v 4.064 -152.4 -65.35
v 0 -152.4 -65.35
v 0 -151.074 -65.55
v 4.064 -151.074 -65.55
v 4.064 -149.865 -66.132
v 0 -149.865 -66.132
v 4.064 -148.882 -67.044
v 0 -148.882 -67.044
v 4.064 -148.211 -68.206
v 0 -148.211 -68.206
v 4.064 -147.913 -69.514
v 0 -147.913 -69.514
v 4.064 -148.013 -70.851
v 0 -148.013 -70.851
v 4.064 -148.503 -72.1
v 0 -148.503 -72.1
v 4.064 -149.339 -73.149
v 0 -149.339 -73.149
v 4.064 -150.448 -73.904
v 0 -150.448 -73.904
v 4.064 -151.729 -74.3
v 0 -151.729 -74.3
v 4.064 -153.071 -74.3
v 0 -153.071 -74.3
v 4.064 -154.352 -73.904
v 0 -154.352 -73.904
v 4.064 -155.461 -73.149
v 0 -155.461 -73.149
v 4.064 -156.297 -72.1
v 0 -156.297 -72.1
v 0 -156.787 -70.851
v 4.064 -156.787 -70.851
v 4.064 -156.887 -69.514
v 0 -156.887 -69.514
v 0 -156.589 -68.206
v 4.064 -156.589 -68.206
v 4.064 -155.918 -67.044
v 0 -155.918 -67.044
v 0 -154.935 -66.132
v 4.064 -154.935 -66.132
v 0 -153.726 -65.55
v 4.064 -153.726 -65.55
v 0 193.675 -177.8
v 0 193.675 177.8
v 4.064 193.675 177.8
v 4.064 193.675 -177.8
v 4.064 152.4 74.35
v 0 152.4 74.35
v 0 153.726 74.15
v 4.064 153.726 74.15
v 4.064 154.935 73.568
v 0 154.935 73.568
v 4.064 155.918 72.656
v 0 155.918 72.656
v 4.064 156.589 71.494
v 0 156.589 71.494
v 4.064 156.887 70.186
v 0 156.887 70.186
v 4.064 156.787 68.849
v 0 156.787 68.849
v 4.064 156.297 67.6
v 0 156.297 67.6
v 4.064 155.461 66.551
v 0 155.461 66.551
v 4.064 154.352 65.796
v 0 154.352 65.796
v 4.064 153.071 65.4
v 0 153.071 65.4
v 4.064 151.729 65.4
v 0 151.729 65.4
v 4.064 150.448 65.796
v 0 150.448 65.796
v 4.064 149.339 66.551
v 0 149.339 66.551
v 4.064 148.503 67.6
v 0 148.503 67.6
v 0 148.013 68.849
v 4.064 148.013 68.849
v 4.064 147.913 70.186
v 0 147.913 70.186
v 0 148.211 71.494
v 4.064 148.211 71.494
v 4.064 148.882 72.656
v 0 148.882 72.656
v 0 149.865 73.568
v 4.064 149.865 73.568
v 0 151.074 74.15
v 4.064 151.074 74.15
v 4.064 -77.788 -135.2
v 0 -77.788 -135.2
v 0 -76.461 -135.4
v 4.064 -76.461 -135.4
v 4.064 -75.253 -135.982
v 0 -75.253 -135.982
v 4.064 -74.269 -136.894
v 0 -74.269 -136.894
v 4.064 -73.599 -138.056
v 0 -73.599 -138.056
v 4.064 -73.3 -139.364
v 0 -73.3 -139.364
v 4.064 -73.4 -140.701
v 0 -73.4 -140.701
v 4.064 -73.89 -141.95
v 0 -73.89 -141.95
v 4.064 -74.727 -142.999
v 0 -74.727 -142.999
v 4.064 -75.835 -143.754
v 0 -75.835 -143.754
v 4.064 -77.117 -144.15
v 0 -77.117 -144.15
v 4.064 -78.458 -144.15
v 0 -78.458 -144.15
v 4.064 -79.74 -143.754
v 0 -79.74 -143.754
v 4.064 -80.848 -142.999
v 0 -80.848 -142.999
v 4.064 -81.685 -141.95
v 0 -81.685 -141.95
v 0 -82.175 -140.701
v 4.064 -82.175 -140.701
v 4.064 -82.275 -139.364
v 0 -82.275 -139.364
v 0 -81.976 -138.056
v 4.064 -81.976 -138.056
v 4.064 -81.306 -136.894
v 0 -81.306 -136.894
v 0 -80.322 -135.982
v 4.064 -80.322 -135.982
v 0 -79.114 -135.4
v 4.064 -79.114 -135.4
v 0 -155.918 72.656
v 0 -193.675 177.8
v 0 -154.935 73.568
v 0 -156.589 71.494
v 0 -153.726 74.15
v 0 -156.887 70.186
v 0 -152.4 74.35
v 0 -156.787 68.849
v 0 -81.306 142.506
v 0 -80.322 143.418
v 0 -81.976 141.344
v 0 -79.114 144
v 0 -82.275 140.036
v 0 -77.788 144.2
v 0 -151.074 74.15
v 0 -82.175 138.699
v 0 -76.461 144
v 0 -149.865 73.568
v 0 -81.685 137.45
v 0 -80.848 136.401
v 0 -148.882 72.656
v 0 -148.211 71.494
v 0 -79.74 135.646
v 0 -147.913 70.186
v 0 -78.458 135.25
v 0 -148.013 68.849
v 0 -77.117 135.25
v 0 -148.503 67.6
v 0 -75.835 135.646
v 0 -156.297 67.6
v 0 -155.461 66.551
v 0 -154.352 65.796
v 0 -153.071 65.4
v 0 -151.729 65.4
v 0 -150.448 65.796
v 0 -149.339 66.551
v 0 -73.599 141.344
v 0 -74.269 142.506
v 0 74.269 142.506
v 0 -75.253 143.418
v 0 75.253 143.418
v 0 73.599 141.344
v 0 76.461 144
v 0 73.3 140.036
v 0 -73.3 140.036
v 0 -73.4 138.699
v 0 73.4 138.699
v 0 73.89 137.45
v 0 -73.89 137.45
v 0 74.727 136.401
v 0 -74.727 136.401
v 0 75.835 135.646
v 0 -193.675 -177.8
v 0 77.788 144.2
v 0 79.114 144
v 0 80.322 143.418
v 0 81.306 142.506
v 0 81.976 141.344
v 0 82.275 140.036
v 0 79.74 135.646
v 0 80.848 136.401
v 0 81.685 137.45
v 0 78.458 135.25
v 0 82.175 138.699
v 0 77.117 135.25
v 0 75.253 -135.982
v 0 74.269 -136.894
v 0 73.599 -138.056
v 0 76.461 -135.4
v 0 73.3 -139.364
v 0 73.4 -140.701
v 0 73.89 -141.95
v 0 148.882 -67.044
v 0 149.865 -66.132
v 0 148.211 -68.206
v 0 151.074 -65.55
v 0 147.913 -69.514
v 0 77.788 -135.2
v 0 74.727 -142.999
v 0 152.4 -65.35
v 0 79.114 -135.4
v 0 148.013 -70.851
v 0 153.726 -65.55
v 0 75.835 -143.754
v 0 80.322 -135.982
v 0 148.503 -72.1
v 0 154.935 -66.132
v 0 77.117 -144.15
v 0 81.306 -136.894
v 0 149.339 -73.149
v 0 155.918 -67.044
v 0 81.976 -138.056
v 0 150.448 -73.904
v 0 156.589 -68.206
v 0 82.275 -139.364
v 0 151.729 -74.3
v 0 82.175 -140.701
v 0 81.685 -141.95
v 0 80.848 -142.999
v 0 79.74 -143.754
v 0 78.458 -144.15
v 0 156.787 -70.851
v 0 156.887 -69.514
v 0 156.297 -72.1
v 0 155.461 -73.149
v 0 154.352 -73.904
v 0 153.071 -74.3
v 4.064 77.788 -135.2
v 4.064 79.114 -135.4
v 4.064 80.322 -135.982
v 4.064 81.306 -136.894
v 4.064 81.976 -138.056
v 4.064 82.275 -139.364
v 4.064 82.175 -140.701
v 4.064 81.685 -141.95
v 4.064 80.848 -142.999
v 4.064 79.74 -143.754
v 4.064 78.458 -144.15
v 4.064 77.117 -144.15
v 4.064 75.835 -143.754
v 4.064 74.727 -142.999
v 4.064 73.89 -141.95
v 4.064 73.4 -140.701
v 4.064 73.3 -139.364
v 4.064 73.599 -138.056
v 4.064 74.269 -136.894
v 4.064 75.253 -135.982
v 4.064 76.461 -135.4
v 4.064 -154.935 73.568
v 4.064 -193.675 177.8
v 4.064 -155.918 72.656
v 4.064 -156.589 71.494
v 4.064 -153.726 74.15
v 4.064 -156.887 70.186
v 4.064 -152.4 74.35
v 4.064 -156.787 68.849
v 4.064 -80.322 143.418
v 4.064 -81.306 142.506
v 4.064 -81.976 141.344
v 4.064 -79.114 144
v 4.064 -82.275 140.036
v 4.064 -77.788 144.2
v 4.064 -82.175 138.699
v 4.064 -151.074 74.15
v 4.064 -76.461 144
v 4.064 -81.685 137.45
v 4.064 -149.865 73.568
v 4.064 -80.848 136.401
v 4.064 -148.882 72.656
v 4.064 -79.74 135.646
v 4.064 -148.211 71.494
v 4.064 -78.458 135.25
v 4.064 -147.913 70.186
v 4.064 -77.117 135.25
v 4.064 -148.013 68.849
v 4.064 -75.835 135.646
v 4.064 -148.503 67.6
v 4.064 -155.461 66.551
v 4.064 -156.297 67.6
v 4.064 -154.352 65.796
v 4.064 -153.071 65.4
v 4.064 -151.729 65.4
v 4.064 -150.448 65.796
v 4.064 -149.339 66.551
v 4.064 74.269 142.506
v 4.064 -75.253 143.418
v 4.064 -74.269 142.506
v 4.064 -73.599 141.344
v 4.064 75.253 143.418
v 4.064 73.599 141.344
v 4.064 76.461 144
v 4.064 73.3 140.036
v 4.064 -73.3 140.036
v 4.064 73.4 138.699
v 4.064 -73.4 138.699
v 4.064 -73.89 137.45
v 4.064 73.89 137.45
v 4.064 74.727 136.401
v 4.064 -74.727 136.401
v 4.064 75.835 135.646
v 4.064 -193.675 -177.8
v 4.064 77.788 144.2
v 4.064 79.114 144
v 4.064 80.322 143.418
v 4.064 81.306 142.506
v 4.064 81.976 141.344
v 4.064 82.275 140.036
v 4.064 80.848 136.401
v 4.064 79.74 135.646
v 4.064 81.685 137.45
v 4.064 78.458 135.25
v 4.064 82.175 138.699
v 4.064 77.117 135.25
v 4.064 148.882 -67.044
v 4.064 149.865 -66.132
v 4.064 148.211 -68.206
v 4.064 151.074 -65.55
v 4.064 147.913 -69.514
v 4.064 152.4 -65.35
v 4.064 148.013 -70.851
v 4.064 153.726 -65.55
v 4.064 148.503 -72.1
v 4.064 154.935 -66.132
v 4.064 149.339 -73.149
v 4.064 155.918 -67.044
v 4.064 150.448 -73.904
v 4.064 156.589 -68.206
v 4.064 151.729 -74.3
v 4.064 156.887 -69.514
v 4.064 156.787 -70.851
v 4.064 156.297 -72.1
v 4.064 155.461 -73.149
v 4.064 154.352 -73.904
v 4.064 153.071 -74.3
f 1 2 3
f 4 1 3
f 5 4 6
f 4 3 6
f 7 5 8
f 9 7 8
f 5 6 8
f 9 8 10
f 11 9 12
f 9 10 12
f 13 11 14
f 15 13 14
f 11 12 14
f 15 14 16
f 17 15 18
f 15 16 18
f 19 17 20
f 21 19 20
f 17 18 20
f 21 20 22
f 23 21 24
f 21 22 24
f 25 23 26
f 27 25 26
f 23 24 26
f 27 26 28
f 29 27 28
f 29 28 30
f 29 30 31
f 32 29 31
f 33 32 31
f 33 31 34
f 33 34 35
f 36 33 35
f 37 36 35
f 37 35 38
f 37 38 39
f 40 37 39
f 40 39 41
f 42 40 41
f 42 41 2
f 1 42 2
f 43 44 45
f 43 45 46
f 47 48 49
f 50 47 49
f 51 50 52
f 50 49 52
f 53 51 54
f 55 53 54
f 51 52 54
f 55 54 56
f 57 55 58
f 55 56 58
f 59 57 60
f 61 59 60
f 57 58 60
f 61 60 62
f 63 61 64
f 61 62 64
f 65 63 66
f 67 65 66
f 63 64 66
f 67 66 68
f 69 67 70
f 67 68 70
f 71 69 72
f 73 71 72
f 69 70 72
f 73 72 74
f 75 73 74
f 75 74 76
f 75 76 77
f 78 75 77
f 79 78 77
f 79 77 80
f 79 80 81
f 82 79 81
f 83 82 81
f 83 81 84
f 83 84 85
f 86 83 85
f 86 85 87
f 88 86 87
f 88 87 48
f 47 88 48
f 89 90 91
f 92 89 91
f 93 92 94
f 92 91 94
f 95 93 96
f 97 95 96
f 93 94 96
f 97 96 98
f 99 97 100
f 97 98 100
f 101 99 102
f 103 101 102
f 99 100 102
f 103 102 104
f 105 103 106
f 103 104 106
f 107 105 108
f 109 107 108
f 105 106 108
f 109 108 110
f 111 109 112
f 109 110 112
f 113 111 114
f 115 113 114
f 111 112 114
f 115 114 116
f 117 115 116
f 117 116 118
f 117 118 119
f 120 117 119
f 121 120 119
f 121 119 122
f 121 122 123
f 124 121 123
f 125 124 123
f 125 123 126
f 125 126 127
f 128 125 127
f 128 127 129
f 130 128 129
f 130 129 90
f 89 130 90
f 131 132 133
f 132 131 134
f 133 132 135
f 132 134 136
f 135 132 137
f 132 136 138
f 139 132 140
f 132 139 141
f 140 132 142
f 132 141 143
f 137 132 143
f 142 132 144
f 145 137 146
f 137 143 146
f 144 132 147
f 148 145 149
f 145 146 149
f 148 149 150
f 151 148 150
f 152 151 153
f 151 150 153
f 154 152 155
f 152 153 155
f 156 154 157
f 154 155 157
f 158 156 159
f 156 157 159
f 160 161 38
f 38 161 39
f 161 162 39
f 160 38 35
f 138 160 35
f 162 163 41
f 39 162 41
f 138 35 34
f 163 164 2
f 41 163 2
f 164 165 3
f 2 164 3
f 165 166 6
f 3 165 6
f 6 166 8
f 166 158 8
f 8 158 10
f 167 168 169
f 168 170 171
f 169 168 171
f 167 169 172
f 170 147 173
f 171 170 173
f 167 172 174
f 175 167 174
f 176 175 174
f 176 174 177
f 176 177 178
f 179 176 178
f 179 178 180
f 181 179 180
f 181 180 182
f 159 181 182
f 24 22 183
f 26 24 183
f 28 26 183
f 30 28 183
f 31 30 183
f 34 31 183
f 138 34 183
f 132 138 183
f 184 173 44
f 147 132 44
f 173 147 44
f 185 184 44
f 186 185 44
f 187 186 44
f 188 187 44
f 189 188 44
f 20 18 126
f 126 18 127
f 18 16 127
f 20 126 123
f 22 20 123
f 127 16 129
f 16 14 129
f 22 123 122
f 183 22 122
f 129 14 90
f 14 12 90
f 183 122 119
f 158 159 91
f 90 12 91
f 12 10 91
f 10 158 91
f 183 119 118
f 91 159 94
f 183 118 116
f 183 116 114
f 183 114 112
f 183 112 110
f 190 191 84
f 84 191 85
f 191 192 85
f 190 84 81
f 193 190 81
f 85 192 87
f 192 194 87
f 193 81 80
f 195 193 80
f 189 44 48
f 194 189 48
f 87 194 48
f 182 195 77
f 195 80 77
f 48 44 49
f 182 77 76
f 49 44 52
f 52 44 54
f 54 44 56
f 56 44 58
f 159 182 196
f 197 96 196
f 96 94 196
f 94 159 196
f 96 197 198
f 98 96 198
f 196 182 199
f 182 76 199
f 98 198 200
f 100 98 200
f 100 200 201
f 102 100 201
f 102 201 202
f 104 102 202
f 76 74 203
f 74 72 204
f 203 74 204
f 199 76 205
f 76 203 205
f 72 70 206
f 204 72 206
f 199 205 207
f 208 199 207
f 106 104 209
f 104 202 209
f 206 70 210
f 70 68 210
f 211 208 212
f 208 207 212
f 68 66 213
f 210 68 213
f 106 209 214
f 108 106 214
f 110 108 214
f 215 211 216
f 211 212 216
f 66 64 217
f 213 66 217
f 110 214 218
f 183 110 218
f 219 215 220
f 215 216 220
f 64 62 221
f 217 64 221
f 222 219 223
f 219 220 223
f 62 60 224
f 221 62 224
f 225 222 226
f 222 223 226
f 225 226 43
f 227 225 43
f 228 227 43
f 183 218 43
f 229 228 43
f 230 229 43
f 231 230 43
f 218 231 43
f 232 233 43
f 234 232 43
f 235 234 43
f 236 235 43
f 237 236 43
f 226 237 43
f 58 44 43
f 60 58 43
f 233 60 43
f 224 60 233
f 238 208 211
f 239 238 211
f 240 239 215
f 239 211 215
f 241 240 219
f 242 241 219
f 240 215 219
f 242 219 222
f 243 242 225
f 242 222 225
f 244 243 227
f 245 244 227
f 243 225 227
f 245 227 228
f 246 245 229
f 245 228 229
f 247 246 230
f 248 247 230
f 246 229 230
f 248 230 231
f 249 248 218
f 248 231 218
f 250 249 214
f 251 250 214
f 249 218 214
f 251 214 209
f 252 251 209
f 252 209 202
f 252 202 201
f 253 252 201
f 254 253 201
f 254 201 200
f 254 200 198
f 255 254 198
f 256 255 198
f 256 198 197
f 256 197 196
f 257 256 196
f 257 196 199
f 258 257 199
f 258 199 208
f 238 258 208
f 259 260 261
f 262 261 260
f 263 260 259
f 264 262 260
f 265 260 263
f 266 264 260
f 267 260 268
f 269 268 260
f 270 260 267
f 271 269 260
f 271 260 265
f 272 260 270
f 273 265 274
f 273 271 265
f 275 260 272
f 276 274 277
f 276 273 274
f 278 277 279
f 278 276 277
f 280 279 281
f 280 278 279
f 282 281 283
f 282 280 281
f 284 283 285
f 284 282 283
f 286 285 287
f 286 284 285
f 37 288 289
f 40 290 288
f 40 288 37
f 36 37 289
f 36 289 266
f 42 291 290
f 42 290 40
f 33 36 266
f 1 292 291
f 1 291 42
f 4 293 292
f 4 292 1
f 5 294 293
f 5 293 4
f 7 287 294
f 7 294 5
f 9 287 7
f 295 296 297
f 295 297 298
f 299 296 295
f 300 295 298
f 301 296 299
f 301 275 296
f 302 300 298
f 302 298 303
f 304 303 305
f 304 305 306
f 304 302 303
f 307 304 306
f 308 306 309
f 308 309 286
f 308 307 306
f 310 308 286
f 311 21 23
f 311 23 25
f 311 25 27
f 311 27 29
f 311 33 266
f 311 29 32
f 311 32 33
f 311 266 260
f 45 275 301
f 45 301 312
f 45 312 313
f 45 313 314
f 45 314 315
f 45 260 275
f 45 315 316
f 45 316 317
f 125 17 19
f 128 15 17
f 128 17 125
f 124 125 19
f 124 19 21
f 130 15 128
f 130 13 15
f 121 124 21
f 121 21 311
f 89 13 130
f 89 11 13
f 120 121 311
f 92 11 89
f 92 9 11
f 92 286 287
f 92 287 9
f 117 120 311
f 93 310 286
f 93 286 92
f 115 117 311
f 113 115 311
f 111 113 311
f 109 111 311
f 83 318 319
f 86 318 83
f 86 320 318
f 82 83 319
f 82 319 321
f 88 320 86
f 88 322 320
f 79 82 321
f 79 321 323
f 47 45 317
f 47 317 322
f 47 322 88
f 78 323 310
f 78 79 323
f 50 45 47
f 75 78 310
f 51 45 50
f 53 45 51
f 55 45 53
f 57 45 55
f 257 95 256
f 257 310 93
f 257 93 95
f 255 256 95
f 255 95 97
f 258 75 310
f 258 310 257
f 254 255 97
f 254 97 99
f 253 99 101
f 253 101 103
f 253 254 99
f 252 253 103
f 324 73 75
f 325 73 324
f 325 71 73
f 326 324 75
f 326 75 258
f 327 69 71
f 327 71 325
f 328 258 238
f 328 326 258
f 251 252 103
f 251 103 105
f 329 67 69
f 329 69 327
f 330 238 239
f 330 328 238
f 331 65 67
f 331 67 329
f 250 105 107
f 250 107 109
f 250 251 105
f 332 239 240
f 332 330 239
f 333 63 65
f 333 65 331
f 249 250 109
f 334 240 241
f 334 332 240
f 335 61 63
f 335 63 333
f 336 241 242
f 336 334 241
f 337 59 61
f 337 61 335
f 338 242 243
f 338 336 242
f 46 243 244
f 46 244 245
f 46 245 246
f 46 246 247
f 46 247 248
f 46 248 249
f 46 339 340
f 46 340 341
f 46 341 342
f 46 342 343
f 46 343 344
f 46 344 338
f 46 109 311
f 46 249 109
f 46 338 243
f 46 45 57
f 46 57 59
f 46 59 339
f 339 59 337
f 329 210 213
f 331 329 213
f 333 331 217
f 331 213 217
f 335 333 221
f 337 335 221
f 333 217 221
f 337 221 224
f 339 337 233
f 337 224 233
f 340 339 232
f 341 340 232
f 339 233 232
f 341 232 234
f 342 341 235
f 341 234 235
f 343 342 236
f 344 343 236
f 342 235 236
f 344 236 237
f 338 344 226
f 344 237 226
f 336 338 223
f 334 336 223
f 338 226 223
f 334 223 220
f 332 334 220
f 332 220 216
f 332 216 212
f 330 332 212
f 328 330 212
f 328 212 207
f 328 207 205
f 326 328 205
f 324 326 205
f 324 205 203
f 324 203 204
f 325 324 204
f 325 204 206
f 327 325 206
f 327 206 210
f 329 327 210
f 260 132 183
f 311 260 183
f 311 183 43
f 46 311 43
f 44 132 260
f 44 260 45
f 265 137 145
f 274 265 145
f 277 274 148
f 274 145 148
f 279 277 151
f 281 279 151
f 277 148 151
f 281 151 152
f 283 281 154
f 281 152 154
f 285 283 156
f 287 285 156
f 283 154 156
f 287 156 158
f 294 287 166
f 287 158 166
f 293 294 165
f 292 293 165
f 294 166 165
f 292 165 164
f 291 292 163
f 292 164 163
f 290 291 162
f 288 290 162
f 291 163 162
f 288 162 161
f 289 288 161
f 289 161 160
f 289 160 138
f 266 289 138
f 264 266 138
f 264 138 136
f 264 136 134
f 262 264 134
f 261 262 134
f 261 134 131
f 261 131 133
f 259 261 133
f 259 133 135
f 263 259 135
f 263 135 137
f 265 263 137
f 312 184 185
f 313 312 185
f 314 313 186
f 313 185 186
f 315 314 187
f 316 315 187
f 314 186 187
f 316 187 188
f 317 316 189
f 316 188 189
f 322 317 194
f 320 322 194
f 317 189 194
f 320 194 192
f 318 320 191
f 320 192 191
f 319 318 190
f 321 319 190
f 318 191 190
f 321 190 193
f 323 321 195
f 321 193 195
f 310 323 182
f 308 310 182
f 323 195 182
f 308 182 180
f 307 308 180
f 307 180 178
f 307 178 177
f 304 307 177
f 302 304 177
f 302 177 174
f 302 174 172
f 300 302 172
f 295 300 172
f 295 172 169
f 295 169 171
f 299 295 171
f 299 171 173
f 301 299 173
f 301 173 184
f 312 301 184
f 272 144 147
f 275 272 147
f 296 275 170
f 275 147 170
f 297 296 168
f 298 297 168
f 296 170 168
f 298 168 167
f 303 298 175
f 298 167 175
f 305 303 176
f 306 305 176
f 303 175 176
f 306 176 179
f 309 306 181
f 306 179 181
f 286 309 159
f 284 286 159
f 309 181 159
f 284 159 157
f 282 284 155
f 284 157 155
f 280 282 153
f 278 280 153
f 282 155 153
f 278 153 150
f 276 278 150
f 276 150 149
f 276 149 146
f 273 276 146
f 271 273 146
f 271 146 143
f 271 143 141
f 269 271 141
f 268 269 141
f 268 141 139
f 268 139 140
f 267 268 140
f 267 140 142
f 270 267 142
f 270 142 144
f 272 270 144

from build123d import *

# Parameters (mm, degrees)
SKETCH1_W            = 355.6
SKETCH1_H            = 387.35
SKETCH1_R            = 4.0005
BOSS_EXTRUDE1_DEPTH  = 4.064
M8_CLEARANCE_HOLE1_D = 9


with BuildPart() as part:
    # Sketch1 → Boss-Extrude1 (new body)
    # profile 1 of 9: a face of its own
    with BuildSketch(Plane(origin=(0, 0, 0), x_dir=(0, 0, -1), z_dir=(1, 0, 0))):
        Rectangle(SKETCH1_W, SKETCH1_H)
        with Locations((139.7, 77.7875)):
            Circle(SKETCH1_R, mode=Mode.SUBTRACT)
        with Locations((69.85, 152.4)):
            Circle(SKETCH1_R, mode=Mode.SUBTRACT)
        with Locations((-139.7, 77.7875)):
            Circle(SKETCH1_R, mode=Mode.SUBTRACT)
        with Locations((-139.7, -77.7875)):
            Circle(SKETCH1_R, mode=Mode.SUBTRACT)
        with Locations((-69.85, -152.4)):
            Circle(SKETCH1_R, mode=Mode.SUBTRACT)
        with Locations((69.85, -152.4)):
            Circle(SKETCH1_R, mode=Mode.SUBTRACT)
        with Locations((-69.85, 152.4)):
            Circle(SKETCH1_R, mode=Mode.SUBTRACT)
        with Locations((139.7, -77.7875)):
            Circle(SKETCH1_R, mode=Mode.SUBTRACT)
    # profile 2 of 9: a face of its own
    with BuildSketch(Plane(origin=(0, 0, 0), x_dir=(0, 0, -1), z_dir=(1, 0, 0))):
        with Locations((-69.85, -152.4)):
            Circle(SKETCH1_R)
    # profile 3 of 9: a face of its own
    with BuildSketch(Plane(origin=(0, 0, 0), x_dir=(0, 0, -1), z_dir=(1, 0, 0))):
        with Locations((69.85, -152.4)):
            Circle(SKETCH1_R)
    # profile 4 of 9: a face of its own
    with BuildSketch(Plane(origin=(0, 0, 0), x_dir=(0, 0, -1), z_dir=(1, 0, 0))):
        with Locations((139.7, -77.7875)):
            Circle(SKETCH1_R)
    # profile 5 of 9: a face of its own
    with BuildSketch(Plane(origin=(0, 0, 0), x_dir=(0, 0, -1), z_dir=(1, 0, 0))):
        with Locations((139.7, 77.7875)):
            Circle(SKETCH1_R)
    # profile 6 of 9: a face of its own
    with BuildSketch(Plane(origin=(0, 0, 0), x_dir=(0, 0, -1), z_dir=(1, 0, 0))):
        with Locations((69.85, 152.4)):
            Circle(SKETCH1_R)
    # profile 7 of 9: a face of its own
    with BuildSketch(Plane(origin=(0, 0, 0), x_dir=(0, 0, -1), z_dir=(1, 0, 0))):
        with Locations((-69.85, 152.4)):
            Circle(SKETCH1_R)
    # profile 8 of 9: a face of its own
    with BuildSketch(Plane(origin=(0, 0, 0), x_dir=(0, 0, -1), z_dir=(1, 0, 0))):
        with Locations((-139.7, 77.7875)):
            Circle(SKETCH1_R)
    # profile 9 of 9: a face of its own
    with BuildSketch(Plane(origin=(0, 0, 0), x_dir=(0, 0, -1), z_dir=(1, 0, 0))):
        with Locations((-139.7, -77.7875)):
            Circle(SKETCH1_R)
    extrude(amount=BOSS_EXTRUDE1_DEPTH)

    # M8 Clearance Hole1 (through all)
    with Locations(Plane(origin=(4.064, 0, 0), x_dir=(0, 0, -1), z_dir=(1, 0, 0))):
        with Locations((-139.7, 77.7875), (-69.85, 152.4), (69.85, 152.4), (139.7, 77.7875), (139.7, -77.7875), (69.85, -152.4), (-69.85, -152.4), (-139.7, -77.7875)):
            Hole(M8_CLEARANCE_HOLE1_D / 2)


solid = part.part
